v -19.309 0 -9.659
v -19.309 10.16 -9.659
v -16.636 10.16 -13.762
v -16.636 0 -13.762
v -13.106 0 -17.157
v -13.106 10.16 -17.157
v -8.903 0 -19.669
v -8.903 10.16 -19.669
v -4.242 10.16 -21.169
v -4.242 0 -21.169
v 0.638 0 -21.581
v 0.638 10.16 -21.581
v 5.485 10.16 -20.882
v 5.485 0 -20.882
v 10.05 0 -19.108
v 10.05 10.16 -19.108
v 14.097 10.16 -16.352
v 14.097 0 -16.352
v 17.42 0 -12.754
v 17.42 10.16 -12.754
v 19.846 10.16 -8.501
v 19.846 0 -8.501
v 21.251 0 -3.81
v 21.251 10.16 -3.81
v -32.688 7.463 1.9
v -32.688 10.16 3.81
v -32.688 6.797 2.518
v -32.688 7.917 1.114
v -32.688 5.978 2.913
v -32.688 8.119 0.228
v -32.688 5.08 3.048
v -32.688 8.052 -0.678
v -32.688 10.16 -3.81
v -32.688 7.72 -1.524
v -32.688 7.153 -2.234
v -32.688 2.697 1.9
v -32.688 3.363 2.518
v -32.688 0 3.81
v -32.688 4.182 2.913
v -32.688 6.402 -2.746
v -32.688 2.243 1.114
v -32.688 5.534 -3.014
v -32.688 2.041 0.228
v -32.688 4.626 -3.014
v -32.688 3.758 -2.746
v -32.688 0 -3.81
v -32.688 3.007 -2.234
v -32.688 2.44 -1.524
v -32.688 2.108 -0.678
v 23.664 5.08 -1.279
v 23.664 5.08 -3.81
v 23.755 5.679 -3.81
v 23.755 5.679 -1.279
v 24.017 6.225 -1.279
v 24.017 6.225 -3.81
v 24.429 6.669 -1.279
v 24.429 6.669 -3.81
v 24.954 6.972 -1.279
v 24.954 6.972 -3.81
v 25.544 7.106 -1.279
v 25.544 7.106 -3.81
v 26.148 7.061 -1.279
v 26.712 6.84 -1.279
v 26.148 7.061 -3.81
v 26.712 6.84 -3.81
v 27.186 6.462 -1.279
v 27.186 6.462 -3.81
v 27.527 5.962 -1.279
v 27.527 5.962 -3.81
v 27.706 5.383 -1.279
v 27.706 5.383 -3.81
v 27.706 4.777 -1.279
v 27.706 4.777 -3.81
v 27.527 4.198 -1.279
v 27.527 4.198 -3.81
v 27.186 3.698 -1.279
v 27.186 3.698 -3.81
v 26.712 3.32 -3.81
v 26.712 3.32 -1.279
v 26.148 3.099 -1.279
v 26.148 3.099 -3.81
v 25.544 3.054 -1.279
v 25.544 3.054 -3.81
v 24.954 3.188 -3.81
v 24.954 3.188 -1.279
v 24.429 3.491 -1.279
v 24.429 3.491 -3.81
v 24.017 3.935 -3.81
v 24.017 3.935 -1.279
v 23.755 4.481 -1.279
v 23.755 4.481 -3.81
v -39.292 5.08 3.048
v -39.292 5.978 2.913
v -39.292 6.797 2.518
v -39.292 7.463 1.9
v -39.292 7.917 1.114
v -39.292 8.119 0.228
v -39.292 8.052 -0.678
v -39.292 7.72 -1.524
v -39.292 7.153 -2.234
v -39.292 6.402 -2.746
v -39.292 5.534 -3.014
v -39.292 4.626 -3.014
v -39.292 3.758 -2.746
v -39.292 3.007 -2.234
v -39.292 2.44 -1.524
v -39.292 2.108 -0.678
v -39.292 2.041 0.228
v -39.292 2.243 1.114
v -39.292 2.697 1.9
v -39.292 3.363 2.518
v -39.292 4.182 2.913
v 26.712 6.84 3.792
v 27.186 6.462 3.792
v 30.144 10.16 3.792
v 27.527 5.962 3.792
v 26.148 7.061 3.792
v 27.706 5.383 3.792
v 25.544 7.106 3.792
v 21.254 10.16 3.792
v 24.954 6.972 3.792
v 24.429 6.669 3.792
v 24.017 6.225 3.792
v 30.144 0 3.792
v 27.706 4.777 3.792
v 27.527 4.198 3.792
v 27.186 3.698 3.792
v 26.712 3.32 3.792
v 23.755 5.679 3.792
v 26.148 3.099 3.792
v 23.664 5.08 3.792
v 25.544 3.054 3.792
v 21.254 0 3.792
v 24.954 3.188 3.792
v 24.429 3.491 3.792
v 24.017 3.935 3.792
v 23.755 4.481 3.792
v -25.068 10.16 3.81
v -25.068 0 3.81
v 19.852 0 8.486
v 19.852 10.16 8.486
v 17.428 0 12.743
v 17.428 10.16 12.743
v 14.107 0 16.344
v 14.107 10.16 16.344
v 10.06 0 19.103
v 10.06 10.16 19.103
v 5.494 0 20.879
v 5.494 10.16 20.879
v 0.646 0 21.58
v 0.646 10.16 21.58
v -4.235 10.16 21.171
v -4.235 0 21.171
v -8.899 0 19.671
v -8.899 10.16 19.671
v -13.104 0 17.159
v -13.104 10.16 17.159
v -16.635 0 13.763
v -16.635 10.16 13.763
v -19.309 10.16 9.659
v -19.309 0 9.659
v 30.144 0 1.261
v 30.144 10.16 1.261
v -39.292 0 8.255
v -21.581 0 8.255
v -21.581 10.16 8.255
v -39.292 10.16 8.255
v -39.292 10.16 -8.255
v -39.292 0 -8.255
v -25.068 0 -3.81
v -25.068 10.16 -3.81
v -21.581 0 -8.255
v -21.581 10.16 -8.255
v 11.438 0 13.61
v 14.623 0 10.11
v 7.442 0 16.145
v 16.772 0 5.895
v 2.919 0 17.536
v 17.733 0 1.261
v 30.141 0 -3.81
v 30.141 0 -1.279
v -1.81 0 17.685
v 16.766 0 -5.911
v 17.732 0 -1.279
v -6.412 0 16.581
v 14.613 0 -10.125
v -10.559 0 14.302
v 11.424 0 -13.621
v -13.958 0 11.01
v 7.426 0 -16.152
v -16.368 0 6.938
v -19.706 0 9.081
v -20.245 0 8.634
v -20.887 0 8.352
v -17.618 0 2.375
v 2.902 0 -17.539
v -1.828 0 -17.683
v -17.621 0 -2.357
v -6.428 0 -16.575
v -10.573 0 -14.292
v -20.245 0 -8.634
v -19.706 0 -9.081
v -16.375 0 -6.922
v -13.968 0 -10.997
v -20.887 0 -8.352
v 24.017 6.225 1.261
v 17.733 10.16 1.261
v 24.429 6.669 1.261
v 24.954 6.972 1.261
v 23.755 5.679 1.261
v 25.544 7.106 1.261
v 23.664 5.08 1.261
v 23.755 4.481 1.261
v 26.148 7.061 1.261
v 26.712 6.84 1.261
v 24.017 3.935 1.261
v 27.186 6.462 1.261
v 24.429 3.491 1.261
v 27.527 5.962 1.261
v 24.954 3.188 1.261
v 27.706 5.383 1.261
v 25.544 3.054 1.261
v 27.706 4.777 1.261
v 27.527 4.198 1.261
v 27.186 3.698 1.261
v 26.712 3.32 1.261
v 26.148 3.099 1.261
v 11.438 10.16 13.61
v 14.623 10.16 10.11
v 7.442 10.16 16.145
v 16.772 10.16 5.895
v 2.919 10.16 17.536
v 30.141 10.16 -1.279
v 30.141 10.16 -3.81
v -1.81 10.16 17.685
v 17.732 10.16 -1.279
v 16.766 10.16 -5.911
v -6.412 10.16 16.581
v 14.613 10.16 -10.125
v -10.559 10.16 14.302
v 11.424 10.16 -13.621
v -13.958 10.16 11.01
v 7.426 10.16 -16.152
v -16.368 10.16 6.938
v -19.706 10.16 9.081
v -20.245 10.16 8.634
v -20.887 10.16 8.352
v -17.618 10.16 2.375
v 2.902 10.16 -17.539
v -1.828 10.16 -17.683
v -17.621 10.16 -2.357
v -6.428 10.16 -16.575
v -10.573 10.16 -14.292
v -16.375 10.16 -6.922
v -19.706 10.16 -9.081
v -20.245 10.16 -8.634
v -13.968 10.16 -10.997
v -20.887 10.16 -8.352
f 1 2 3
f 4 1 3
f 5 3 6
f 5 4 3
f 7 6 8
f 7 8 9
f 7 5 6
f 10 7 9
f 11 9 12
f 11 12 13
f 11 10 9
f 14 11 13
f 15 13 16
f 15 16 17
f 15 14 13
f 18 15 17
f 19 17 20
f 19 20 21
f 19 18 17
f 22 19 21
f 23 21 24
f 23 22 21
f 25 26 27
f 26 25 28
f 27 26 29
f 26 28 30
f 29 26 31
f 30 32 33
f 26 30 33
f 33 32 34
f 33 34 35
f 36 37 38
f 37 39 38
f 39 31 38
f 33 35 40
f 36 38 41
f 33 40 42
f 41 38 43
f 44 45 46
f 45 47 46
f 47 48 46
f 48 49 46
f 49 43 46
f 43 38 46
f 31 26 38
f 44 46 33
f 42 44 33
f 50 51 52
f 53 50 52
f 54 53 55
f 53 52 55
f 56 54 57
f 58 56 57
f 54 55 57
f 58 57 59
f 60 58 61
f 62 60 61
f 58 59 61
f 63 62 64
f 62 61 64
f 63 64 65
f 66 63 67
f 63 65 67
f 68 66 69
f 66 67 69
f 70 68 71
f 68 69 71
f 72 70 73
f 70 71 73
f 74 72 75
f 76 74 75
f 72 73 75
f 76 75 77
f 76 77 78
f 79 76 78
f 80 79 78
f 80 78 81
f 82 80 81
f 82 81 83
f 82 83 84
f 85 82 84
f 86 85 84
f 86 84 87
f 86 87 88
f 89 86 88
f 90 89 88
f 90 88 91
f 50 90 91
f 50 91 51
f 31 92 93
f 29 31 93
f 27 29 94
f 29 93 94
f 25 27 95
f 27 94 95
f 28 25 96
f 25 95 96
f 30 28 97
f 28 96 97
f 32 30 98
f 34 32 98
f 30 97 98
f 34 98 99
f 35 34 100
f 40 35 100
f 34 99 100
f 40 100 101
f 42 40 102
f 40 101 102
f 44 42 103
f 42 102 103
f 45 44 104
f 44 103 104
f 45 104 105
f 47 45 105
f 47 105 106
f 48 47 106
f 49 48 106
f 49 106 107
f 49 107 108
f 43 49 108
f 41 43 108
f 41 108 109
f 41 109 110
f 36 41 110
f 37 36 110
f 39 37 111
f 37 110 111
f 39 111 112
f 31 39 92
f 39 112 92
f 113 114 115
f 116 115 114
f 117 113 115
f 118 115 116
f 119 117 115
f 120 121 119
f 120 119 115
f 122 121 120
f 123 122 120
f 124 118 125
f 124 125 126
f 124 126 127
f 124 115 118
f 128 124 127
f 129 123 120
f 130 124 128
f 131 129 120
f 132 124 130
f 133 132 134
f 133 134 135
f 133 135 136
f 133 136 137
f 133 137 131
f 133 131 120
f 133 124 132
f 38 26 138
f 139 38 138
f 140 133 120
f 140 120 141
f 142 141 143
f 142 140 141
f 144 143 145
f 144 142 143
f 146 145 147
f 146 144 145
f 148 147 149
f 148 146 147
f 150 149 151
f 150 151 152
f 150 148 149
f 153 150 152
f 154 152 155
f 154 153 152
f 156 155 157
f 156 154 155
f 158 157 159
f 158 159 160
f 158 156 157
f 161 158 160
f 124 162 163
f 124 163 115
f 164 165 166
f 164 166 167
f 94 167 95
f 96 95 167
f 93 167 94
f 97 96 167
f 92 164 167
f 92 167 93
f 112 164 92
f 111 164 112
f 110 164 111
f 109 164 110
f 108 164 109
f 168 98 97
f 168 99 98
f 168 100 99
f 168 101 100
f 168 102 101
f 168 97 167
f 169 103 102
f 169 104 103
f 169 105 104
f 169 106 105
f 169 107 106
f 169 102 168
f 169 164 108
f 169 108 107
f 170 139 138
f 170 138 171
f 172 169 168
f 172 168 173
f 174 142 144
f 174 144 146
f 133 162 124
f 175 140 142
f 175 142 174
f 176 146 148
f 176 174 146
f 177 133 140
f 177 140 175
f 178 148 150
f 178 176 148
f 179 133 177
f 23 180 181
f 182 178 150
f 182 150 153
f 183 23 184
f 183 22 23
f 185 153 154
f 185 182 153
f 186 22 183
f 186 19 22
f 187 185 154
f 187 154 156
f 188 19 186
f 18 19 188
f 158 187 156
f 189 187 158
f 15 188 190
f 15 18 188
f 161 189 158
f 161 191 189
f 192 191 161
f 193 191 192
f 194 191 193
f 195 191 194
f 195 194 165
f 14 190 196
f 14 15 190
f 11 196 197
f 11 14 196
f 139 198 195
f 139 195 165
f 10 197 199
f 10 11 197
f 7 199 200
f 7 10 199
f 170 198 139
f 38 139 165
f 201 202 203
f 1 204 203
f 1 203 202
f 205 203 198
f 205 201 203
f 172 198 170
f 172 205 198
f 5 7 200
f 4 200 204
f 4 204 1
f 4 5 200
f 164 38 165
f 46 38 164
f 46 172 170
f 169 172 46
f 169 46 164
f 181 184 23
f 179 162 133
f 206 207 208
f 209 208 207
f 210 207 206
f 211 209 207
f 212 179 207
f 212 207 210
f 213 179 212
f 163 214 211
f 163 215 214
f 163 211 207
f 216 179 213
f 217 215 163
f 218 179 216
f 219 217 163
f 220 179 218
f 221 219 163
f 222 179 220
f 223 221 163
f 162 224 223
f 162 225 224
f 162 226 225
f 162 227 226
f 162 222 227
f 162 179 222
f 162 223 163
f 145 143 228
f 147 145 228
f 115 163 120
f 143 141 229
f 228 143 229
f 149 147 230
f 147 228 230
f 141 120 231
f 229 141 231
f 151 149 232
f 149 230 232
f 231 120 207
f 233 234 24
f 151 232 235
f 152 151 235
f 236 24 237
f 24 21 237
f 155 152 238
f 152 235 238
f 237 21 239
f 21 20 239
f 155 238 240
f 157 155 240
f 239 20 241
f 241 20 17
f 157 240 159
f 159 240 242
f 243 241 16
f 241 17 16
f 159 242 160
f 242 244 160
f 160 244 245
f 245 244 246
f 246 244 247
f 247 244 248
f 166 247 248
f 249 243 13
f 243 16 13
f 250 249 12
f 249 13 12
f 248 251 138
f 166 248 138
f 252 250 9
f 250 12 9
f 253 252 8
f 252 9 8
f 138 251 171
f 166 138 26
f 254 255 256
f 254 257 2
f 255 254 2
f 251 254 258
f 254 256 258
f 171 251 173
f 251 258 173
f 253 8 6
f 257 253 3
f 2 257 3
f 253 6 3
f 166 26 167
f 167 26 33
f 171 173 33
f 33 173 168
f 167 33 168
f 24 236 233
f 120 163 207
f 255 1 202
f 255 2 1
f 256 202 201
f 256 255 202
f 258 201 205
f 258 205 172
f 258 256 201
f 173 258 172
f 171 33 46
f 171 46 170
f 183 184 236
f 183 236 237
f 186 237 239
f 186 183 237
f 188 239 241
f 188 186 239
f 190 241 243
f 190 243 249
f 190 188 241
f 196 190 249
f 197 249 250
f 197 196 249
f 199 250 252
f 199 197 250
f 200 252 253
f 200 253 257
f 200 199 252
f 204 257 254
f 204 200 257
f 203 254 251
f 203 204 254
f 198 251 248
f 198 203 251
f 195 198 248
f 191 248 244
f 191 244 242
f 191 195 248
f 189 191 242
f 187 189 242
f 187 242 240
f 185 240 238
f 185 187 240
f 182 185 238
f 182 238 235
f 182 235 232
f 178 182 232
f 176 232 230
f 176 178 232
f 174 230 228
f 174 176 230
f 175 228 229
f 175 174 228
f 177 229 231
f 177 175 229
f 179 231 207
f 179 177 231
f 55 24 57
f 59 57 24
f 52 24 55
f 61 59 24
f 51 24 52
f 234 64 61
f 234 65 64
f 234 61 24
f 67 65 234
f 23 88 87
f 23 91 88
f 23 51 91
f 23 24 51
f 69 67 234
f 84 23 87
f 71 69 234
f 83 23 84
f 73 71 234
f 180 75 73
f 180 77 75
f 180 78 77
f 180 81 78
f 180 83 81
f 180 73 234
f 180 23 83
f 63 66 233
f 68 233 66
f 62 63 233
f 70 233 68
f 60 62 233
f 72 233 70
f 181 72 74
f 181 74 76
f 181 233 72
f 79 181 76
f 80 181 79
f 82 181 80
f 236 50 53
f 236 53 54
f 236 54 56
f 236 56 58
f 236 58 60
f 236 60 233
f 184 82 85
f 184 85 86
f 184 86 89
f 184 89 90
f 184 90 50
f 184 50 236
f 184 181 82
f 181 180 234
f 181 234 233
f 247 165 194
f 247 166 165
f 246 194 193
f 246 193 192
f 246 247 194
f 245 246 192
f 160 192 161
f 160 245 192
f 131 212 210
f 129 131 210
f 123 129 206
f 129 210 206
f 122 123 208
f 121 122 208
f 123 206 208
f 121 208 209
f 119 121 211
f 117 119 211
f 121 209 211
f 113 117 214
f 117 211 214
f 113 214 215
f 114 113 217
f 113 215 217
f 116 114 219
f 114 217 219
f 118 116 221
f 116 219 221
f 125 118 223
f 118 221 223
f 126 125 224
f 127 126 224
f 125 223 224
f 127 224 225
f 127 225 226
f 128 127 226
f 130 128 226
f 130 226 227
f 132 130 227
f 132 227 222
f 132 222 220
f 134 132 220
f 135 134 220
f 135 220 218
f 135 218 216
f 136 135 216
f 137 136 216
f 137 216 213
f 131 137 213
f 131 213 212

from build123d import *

# Parameters (mm, degrees)
SKETCH1_W           = 7.62
SKETCH1_H           = 7.62
BOSS_EXTRUDE3_DEPTH = 10.16
CUT_EXTRUDE1_REACH  = 49.877
SKETCH5_R           = 2.032
SKETCH6_R           = 3.048
CUT_EXTRUDE2_DEPTH  = 6.604
FILLET1_R           = 2.54


with BuildPart() as part:
    # Sketch1 → Boss-Extrude3 (new body)
    with BuildSketch(Plane(origin=(0, 0, 0), x_dir=(1, 0, 0), z_dir=(0, 1, 0))):
        with BuildLine():
            Line((30.141230573, 3.809632415), (30.141230573, 1.278686529))
            Line((30.141230573, 1.278686529), (17.731545846, 1.278686529))
            ThreePointArc((17.731545846, 1.278686529), (-17.777589304, -0.008709978), (17.732790297, -1.261311079))
            Line((17.732790297, -1.261311079), (30.144338077, -1.261311079))
            Line((30.144338077, -1.261311079), (30.144338077, -3.792256965))
            Line((30.144338077, -3.792256965), (21.254338077, -3.792256965))
            ThreePointArc((21.254338077, -3.792256965), (2.324792651, -21.464469225), (-19.949513152, -8.255))
            Line((-19.949513152, -8.255), (-39.292036048, -8.255))
            Line((-39.292036048, -8.255), (-39.292036048, 8.255))
            Line((-39.292036048, 8.255), (-19.949513152, 8.255))
            ThreePointArc((-19.949513152, 8.255), (2.3160182, 21.465417762), (21.251230573, 3.809632415))
            Line((21.251230573, 3.809632415), (30.141230573, 3.809632415))
        make_face()
        with Locations((-28.878036048, -0.000367585)):
            Rectangle(SKETCH1_W, SKETCH1_H, mode=Mode.SUBTRACT)
    extrude(amount=BOSS_EXTRUDE3_DEPTH)

    # Cut-Extrude1: up to this face of the body (flat: up to its plane)
    cut_extrude1_end = Plane(part.part.faces().sort_by_distance((25.699338077, 5.08, 3.792256965))[0])
    # Sketch5 → Cut-Extrude1 (cut, up to the picked face)
    with BuildSketch(Plane(origin=(0, 0, -3.809632415), x_dir=(-1, 0, 0), z_dir=(0, 0, -1)), mode=Mode.PRIVATE) as cut_extrude1_sk1:
        with Locations((-25.696230573, 5.08)):
            Circle(SKETCH5_R)
    cut_extrude1_tool1 = split(extrude(cut_extrude1_sk1.sketch, amount=-CUT_EXTRUDE1_REACH, mode=Mode.PRIVATE), bisect_by=cut_extrude1_end, keep=Keep.BOTH, mode=Mode.PRIVATE)
    add(cut_extrude1_tool1.solids().sort_by(Axis((25.696231, 5.08, -3.809632), (0, 0, 1)))[0], mode=Mode.SUBTRACT)

    # Sketch6 → Cut-Extrude2 (cut)
    with BuildSketch(Plane.ZY.offset(39.292036048)):
        with Locations((0, 5.08)):
            Circle(SKETCH6_R)
    extrude(amount=-CUT_EXTRUDE2_DEPTH, mode=Mode.SUBTRACT)

    # Fillet1
    fillet1_edges = [part.edges().sort_by_distance(p)[0] for p in [
        (-19.949513152, 5.08, -8.255),
        (-19.949513152, 5.08, 8.255),
    ]]
    fillet(fillet1_edges, radius=FILLET1_R)


solid = part.part
